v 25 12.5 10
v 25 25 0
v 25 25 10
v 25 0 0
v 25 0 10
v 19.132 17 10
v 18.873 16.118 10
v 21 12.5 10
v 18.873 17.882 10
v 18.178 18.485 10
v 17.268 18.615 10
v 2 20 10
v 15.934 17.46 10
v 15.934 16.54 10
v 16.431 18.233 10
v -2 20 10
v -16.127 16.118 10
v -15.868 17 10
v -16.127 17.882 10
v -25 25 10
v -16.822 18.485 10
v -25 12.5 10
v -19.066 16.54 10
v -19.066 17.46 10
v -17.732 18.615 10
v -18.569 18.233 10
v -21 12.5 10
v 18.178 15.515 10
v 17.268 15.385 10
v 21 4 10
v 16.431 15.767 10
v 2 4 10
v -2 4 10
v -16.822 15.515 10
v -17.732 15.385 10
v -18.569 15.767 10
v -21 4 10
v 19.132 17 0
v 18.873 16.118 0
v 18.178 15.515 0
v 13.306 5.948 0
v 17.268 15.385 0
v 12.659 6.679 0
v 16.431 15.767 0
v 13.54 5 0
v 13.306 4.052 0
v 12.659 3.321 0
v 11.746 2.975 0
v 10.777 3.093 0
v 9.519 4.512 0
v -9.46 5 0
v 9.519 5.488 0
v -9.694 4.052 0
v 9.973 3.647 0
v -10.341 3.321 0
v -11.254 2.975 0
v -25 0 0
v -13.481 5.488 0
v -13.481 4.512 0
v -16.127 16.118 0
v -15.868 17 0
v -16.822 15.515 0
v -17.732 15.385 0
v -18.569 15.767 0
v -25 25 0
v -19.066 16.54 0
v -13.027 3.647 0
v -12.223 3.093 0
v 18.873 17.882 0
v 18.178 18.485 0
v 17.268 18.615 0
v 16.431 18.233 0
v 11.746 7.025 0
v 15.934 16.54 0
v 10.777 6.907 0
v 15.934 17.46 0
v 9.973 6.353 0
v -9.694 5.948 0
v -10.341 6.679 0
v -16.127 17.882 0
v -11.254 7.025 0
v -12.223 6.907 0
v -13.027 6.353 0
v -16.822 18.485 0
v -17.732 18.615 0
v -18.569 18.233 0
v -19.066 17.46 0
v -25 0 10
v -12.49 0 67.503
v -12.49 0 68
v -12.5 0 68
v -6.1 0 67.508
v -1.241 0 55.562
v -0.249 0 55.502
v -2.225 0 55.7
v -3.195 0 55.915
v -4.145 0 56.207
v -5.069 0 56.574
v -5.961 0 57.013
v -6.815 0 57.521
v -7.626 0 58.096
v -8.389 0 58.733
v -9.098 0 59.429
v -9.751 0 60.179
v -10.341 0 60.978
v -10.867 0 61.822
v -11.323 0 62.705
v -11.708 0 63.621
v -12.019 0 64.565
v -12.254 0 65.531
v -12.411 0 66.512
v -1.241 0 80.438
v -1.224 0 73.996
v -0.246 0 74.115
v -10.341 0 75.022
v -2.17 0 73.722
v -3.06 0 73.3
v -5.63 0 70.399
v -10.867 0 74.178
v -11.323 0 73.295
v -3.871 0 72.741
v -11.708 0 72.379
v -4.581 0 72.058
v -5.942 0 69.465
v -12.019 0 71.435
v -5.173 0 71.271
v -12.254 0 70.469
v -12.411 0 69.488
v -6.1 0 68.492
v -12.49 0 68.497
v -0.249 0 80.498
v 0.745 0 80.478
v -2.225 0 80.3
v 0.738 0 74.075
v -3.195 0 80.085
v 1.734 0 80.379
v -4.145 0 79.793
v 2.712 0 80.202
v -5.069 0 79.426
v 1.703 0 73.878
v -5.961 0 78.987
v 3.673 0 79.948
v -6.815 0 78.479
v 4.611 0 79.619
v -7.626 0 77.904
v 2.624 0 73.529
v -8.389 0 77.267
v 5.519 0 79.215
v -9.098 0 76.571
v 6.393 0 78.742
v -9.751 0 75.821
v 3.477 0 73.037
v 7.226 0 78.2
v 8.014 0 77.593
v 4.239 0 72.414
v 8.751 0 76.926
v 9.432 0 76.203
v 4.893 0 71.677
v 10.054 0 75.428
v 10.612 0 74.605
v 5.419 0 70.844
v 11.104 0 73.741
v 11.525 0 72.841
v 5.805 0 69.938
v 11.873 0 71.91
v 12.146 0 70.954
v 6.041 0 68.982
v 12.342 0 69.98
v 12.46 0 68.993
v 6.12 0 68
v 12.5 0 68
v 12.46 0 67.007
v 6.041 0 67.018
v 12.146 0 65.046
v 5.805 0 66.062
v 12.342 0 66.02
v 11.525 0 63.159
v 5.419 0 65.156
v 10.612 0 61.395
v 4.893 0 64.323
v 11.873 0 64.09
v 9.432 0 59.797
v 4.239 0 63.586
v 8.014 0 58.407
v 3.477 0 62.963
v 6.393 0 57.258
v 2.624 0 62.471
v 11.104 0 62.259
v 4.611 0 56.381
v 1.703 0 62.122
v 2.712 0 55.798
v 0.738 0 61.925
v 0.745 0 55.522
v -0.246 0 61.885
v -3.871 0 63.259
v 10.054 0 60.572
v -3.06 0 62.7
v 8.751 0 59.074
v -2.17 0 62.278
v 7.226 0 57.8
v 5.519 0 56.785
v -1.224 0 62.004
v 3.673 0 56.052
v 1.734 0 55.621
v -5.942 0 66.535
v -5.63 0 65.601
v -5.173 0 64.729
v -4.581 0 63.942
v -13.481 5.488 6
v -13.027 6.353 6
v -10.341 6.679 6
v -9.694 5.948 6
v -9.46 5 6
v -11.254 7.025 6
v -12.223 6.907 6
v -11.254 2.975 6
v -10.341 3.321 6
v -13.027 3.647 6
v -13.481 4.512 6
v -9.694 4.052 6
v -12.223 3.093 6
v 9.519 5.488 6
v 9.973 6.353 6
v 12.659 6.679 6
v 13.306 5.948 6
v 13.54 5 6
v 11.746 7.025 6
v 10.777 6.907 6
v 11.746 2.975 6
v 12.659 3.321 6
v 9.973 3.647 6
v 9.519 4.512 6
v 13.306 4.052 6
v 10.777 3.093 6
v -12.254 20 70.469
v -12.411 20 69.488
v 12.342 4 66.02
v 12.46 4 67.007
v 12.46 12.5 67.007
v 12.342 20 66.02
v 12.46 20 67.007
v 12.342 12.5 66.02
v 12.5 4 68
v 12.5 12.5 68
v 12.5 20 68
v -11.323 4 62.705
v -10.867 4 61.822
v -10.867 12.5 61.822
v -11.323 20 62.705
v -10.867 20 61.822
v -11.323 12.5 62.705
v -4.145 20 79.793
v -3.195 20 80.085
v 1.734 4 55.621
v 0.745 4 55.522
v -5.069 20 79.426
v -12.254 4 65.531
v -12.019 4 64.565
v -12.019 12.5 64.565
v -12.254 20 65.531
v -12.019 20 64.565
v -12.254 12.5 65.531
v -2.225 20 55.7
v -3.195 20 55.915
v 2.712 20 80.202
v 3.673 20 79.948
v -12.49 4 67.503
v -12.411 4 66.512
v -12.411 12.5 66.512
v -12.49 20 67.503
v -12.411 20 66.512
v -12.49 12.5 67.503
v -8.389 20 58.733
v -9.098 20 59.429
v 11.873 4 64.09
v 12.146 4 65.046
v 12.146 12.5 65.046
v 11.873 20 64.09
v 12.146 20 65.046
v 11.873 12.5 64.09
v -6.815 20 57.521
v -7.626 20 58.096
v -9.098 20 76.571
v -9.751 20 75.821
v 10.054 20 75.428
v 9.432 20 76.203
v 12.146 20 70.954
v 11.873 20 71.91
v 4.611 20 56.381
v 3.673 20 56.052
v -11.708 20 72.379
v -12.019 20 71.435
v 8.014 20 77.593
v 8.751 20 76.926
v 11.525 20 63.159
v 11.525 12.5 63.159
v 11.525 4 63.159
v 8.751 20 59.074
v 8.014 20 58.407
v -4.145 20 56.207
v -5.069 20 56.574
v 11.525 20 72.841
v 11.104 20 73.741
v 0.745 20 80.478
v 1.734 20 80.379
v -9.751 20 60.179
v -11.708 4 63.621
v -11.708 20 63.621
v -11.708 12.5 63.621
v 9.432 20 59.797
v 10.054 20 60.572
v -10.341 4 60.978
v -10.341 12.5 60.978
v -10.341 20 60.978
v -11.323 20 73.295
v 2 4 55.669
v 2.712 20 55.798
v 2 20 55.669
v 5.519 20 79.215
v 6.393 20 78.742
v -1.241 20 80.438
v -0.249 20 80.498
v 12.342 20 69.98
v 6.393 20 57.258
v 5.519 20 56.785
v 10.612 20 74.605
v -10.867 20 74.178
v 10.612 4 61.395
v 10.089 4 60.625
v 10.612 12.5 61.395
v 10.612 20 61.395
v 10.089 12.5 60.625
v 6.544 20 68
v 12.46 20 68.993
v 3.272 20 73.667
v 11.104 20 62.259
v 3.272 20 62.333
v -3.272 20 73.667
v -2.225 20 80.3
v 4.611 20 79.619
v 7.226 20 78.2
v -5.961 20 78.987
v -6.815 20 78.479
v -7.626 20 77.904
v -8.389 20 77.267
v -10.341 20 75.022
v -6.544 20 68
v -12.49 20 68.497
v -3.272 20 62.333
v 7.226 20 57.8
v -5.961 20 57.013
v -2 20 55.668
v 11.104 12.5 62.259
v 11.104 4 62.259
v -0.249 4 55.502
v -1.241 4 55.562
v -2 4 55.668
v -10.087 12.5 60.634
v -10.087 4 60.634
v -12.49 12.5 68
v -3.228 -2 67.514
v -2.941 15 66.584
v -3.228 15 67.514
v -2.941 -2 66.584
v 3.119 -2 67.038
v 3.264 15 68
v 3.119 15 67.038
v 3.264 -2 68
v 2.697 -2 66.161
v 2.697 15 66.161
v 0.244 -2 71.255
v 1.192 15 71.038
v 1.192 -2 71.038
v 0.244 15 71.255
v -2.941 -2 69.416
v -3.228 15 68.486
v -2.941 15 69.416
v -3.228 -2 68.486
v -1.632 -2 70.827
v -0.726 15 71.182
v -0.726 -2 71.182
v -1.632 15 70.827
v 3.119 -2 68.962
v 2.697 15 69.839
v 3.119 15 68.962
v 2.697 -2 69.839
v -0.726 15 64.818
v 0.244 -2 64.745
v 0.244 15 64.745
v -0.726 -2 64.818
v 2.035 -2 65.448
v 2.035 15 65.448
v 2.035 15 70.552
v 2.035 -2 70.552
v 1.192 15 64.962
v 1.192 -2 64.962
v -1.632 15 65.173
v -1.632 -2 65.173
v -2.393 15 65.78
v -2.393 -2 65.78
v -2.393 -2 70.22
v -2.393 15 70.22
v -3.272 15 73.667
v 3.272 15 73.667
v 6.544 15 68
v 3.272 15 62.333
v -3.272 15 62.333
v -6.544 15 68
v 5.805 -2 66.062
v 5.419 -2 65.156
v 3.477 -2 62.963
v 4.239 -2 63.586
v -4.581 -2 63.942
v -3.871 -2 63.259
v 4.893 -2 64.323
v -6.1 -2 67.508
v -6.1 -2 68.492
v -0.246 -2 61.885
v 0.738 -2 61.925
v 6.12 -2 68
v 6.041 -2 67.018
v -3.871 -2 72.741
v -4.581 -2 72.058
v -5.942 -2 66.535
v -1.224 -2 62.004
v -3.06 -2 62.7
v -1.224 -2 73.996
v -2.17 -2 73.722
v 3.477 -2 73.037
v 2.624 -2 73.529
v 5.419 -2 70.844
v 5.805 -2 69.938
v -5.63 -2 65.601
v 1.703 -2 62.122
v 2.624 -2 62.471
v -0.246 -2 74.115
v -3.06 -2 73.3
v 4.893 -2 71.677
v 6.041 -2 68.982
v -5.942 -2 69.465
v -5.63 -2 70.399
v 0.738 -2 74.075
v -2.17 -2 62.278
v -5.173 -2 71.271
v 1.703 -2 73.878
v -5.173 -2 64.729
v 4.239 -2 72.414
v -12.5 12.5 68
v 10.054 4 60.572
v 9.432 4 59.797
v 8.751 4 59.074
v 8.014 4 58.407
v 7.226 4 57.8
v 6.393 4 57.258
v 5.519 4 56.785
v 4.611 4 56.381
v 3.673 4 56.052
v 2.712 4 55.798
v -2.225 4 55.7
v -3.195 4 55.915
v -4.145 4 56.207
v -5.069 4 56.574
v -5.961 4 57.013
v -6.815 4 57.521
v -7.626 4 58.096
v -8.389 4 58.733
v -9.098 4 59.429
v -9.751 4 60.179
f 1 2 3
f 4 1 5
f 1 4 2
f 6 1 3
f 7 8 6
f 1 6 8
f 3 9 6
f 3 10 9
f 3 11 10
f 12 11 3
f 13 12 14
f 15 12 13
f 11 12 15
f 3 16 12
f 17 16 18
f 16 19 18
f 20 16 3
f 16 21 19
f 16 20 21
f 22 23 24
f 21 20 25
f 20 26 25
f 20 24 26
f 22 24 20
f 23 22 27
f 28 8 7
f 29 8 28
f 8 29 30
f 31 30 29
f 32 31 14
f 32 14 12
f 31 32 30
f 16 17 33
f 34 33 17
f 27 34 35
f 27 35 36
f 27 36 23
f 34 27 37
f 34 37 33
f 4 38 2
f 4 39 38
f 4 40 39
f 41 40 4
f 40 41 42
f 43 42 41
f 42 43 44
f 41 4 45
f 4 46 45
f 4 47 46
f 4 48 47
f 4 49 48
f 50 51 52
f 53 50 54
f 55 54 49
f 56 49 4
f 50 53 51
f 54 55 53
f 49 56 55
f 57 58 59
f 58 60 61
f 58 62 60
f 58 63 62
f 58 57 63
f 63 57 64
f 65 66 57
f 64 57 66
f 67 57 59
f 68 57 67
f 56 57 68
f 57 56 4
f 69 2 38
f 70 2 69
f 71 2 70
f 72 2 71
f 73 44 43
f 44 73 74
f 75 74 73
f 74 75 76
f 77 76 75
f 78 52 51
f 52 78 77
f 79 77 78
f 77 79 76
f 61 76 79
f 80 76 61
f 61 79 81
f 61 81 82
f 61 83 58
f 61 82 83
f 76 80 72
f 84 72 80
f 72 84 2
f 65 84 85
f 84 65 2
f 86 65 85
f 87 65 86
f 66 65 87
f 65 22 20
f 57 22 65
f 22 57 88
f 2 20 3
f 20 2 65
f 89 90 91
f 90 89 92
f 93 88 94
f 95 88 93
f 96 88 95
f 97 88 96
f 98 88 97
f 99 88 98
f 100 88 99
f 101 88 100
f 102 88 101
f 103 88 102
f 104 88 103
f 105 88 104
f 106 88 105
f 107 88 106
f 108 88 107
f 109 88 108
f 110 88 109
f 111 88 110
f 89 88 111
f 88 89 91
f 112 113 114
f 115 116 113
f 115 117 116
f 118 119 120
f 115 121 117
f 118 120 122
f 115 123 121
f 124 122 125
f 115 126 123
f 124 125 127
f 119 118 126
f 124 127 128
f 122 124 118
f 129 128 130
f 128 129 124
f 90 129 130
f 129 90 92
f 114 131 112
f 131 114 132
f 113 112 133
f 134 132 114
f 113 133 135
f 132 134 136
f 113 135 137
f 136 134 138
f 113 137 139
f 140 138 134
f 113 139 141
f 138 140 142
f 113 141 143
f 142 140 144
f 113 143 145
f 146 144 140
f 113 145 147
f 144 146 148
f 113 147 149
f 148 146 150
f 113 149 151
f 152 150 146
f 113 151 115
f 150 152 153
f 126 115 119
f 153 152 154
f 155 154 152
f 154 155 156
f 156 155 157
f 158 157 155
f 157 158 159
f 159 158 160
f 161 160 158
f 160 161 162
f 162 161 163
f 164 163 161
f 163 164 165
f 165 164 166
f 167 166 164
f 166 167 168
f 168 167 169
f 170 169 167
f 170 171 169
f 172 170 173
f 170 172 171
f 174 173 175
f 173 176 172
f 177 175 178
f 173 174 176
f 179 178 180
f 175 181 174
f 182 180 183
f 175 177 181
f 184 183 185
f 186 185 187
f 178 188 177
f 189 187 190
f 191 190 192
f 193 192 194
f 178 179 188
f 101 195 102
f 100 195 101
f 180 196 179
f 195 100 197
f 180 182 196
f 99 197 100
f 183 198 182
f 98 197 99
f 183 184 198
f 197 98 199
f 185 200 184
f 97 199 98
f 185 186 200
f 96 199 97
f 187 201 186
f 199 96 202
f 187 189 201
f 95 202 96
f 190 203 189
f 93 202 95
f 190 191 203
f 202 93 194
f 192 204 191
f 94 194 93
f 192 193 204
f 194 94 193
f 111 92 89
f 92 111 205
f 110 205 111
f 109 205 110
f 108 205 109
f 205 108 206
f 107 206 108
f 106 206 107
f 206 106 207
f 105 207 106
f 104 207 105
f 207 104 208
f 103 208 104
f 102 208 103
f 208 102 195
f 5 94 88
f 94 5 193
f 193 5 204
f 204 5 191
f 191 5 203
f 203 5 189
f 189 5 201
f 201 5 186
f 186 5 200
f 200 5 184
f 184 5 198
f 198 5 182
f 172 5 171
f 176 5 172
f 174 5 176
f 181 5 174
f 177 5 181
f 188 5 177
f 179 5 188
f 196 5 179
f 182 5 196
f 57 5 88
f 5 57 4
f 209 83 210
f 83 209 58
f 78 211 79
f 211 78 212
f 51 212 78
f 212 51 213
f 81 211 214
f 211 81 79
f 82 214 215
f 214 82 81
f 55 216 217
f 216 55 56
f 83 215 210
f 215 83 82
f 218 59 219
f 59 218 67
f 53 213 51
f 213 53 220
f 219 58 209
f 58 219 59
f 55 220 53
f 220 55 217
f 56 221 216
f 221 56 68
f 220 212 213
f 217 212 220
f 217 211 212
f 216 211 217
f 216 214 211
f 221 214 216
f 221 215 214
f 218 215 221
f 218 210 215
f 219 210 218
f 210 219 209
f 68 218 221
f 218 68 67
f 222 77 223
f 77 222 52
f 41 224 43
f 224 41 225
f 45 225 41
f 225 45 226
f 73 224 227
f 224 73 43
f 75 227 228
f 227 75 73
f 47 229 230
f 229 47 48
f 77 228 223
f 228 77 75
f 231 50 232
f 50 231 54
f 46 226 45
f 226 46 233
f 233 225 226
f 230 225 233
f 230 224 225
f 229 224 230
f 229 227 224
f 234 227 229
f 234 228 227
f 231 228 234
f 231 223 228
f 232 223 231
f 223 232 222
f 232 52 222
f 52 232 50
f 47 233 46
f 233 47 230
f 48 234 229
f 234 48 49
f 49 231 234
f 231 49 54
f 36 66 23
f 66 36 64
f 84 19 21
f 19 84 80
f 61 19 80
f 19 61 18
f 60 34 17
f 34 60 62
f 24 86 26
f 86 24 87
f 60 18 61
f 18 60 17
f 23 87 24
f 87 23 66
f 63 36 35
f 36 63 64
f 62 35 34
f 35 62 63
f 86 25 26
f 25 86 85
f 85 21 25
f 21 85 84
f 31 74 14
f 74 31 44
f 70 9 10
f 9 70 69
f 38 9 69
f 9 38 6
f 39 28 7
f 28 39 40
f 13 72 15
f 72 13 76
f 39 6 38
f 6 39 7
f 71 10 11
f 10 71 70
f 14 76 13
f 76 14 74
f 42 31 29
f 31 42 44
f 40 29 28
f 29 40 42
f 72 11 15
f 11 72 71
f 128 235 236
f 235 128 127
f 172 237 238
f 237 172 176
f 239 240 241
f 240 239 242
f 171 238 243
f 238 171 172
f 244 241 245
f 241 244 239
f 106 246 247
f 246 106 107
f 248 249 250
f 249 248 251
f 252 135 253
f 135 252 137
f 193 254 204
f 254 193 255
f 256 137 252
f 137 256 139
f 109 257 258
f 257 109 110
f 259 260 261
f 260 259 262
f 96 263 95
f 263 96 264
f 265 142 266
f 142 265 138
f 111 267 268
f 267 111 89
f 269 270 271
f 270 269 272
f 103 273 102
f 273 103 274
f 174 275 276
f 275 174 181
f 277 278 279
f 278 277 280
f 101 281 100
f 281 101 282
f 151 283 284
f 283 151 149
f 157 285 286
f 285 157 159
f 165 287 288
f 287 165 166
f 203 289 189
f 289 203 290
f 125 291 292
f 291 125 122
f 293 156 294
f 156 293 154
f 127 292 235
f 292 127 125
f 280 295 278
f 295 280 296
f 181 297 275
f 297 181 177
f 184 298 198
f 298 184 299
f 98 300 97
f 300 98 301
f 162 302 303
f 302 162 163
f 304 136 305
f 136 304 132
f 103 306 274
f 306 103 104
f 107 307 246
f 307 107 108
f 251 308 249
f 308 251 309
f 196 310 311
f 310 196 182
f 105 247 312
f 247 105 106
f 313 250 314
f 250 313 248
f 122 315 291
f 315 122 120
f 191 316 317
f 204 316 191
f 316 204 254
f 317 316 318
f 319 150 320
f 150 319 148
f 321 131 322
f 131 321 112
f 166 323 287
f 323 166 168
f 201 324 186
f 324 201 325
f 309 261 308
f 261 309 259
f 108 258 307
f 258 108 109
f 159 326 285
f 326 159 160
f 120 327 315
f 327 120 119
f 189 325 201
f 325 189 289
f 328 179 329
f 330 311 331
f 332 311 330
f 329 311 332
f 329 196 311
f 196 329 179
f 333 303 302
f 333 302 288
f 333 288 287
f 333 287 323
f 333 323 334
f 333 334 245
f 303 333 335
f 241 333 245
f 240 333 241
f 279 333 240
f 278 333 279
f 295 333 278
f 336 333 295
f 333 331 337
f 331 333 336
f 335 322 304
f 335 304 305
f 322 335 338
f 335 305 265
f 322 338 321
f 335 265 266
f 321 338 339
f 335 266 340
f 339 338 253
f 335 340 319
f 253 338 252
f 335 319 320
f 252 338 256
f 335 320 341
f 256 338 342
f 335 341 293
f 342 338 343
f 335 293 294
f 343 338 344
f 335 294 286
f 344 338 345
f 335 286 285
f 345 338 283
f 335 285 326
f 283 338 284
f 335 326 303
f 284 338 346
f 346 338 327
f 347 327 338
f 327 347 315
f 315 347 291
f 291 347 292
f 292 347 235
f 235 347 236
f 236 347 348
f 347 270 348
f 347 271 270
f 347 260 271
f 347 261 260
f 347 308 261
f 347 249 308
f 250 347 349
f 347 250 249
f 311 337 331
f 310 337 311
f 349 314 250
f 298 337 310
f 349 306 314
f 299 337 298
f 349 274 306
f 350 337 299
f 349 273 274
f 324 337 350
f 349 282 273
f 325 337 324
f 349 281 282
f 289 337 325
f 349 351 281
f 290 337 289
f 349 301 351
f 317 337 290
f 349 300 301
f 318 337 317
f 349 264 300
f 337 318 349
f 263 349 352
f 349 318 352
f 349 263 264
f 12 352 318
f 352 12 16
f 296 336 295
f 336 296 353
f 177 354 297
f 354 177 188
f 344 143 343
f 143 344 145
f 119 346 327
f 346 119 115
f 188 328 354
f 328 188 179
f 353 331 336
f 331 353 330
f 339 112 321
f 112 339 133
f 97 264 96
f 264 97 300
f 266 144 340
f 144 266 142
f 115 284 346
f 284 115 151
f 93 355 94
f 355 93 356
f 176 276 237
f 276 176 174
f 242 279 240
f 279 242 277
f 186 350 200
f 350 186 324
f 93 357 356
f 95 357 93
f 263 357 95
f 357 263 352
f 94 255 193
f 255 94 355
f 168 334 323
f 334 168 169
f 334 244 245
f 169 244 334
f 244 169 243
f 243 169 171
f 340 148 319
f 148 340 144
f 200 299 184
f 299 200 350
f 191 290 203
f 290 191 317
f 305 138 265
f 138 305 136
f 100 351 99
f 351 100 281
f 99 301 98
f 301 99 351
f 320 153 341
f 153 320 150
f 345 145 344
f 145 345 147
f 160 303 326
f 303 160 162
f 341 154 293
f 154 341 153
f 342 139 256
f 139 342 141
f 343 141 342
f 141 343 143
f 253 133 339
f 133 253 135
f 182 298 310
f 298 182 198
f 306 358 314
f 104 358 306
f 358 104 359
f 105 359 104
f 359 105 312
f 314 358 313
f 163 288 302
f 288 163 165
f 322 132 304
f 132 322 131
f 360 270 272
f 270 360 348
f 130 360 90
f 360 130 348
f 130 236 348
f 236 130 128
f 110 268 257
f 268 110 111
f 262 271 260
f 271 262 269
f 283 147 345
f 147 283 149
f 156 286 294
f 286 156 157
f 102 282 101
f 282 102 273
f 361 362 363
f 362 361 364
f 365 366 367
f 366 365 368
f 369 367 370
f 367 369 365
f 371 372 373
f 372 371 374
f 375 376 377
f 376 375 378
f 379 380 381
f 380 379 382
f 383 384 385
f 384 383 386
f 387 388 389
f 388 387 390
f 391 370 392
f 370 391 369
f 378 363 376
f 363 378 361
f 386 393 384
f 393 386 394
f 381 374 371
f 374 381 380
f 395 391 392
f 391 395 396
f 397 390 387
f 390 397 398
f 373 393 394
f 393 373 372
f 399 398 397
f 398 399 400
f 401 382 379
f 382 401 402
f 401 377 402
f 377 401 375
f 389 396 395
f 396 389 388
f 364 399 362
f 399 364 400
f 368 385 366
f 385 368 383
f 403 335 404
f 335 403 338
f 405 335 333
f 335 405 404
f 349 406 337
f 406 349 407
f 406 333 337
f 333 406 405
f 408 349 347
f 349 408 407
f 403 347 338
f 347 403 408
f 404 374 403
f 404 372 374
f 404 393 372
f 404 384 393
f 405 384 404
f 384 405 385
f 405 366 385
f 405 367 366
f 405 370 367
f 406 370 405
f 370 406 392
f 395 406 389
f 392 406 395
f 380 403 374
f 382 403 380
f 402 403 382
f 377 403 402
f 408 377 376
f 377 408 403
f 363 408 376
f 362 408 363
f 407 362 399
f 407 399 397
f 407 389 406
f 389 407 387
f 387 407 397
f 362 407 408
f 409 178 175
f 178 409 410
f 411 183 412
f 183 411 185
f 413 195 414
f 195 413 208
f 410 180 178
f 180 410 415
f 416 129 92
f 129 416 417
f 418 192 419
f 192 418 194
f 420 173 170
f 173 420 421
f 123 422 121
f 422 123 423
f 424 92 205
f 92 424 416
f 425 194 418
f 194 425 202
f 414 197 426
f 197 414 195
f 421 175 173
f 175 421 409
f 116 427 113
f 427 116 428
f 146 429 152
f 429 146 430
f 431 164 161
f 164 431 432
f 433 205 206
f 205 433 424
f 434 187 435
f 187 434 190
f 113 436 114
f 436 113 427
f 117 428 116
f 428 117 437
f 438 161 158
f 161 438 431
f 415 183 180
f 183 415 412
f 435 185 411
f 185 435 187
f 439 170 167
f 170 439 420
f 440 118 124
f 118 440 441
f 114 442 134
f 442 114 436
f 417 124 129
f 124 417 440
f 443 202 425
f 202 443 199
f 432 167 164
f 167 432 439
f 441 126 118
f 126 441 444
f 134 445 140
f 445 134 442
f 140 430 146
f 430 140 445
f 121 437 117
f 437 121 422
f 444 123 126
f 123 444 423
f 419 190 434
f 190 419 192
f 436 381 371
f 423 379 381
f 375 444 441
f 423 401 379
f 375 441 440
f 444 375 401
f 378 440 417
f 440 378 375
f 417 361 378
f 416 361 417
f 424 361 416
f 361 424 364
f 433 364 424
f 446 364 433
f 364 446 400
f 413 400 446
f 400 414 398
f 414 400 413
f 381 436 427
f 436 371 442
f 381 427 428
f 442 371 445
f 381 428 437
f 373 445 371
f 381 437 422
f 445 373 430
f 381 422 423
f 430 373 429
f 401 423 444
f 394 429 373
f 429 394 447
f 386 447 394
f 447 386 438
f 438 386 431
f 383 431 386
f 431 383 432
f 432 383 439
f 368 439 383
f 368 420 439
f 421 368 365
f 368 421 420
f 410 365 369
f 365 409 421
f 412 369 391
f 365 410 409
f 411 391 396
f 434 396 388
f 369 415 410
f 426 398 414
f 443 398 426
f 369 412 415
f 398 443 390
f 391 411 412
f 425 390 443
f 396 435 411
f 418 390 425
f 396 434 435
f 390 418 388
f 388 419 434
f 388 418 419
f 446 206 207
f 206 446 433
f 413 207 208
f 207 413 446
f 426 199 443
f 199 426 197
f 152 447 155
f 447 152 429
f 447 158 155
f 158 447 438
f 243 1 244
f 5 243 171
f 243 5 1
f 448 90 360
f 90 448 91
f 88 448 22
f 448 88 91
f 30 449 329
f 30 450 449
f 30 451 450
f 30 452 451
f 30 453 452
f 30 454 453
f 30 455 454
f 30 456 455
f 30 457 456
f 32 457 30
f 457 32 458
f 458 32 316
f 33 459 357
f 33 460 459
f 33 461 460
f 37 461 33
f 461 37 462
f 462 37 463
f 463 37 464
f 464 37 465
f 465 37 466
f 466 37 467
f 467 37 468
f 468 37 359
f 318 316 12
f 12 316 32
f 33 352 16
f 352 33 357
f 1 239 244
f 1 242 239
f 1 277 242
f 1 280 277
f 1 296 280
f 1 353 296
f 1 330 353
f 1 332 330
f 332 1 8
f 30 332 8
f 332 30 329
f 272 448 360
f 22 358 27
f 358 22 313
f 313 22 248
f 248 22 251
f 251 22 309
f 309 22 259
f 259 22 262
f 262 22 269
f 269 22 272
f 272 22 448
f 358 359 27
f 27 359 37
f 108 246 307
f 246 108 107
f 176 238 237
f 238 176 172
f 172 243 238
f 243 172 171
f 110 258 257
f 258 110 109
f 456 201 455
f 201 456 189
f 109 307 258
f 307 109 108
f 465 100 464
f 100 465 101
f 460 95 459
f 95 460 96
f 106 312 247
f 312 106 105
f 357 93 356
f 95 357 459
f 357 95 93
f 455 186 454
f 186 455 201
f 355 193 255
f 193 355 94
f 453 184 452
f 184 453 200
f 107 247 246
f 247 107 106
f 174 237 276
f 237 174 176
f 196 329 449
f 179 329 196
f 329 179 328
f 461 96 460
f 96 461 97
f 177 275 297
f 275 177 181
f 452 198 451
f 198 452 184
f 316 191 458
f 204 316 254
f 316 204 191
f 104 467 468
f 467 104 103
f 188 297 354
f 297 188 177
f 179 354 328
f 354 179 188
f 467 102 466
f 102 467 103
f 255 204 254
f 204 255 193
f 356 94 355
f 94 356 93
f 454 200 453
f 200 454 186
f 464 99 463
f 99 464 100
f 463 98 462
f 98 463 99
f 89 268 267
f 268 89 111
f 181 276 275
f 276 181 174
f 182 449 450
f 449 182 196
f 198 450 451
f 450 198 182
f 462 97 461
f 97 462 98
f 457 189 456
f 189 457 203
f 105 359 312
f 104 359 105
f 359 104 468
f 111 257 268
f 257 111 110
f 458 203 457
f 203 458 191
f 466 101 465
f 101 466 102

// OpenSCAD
/*
 * Reel holder - replacement for standard FlashForge Inventor
 * to work with reel hubs and hub adapters to accommodate a
 * wide range of standard reels.  Handles up to 200mm diameter
 * reels of up to 1kg mass.
 */

$fa = 1;
$fs = 1;

// Base Plate dimensions.
BPWidth = 50;
BPDepth = 25;
BPHeight = 10;
PinDiameter = 4;
HoleDiameter = 3.2;
PinSep = 23;
HoleSep = 35;
PinOff = 5;
HoleOff = 17;
PinH = 6;
Wall = 4;

FudgeFactor = 2;

in = 25.4;

// Standoff dimensions
SOHeight = 58;
SOWidth = 25;
SODepth = 20;
SOHoleDiameter = 6.4; // The width of the bolt used.
SOOffset = 2;
SOCollarDiameter = 12; // Max width of the inner bushing of the bearing

// Nut head
NHDepth = 5;
NHWidth = 7/16*in;
NHDiameter = NHWidth / cos(30);
NHR = NHDiameter * (1 + FudgeFactor/100) / 2;

// Various adjusted radii
PinR = PinDiameter/2*(1+FudgeFactor/100);
HoleR = HoleDiameter/2*(1+FudgeFactor/100);
SOHoleR = SOHoleDiameter/2*(1+FudgeFactor/100);
SOCollarR = SOCollarDiameter/2*(1+FudgeFactor/100);

// Base Plate
difference(){
  translate([-1*BPWidth/2,0,0]){
    cube([BPWidth,BPDepth,BPHeight]);
  }
  translate([-1*PinSep/2,PinOff,0]){
    cylinder(r=PinR,h=PinH);
  }
  translate([PinSep/2,PinOff,0]){
    cylinder(r=PinR,h=PinH);
  }
  translate([-1*HoleSep/2,HoleOff,0]) {
    cylinder(r=HoleR, h=BPHeight);
  }
  translate([HoleSep/2,HoleOff,0]) {
    cylinder(r=HoleR, h=BPHeight);
  }
}

// Nut Holder
translate([0,0,SOHeight+BPHeight]){
    difference() {
            rotate(a=-90, v=[1,0,0]) {
        cylinder(r=SOWidth/2,h=SODepth);
            }
            rotate(a=-90, v=[1,0,0]){
        cylinder(r=SOHoleR,h=SODepth);
            }
       translate([0,SODepth-NHDepth,0]){
            rotate(a=-90, v=[1,0,0]){
            cylinder(r=NHR, h=NHDepth, $fn=6);
        }
    }
    }
    translate([0,-1*SOOffset,0]){
        rotate(a=-90,v=[1,0,0]) {
        difference(){
          cylinder(r=SOCollarR, h=SOOffset);
          cylinder(r=SOHoleR, h=SOOffset);
        }
    }
}
}

// Standoff
// Front plate
difference(){
    union(){
    polyhedron(points=[
     [-1*BPWidth/2,0,BPHeight], // 0
     [BPWidth/2,0,BPHeight], // 1
     [BPWidth/2,Wall, BPHeight], // 2
     [-1*BPWidth/2,Wall,BPHeight], // 3
     [-1*SOWidth/2,0,BPHeight+SOHeight], // 4
     [SOWidth/2, 0, BPHeight+SOHeight], // 5
     [SOWidth/2, Wall, BPHeight+SOHeight], // 6
     [-1*SOWidth/2, Wall, BPHeight+SOHeight] // 7
    ],
    faces=[
    [0,1,2,3],  // bottom
  [4,5,1,0],  // front
  [7,6,5,4],  // top
  [5,6,2,1],  // right
  [6,7,3,2],  // back
  [7,4,0,3] // left
    ]);
    translate([-1*Wall/2, 0, BPHeight]){
        cube([Wall, SODepth, SOHeight + Wall/2 - SOWidth/2]);
    }
    polyhedron(points=[
    [BPWidth/2,Wall, BPHeight],
    [BPWidth/2,BPDepth/2, BPHeight],
    [BPWidth/2-Wall,BPDepth/2,BPHeight],
    [BPWidth/2-Wall, Wall, BPHeight],
    [SOWidth/2,Wall, BPHeight+SOHeight],
    [SOWidth/2,BPDepth/2, BPHeight+SOHeight],
    [SOWidth/2-Wall,BPDepth/2,BPHeight+SOHeight],
    [SOWidth/2-Wall, Wall, BPHeight+SOHeight]
    ],
    faces=[
        [0,1,2,3],  // bottom
  [4,5,1,0],  // front
  [7,6,5,4],  // top
  [5,6,2,1],  // right
  [6,7,3,2],  // back
  [7,4,0,3] // left
    ]);
       polyhedron(points=[
    [-1*BPWidth/2,Wall, BPHeight],
    [-1*BPWidth/2,BPDepth/2, BPHeight],
    [-1*(BPWidth/2-Wall),BPDepth/2,BPHeight],
    [-1*(BPWidth/2-Wall), Wall, BPHeight],
    [-1*SOWidth/2,Wall, BPHeight+SOHeight],
    [-1*SOWidth/2,BPDepth/2, BPHeight+SOHeight],
    [-1*(SOWidth/2-Wall),BPDepth/2,BPHeight+SOHeight],
    [-1*(SOWidth/2-Wall), Wall, BPHeight+SOHeight]
    ],
    faces=[
        [0,1,2,3],  // bottom
  [4,5,1,0],  // front
  [7,6,5,4],  // top
  [5,6,2,1],  // right
  [6,7,3,2],  // back
  [7,4,0,3] // left
    ]);
}
    translate([0,0,BPHeight+SOHeight]){
      rotate(a=-90,v=[1,0,0]){
        cylinder(r=SOWidth/2,h=Wall);
      }
    }
}
